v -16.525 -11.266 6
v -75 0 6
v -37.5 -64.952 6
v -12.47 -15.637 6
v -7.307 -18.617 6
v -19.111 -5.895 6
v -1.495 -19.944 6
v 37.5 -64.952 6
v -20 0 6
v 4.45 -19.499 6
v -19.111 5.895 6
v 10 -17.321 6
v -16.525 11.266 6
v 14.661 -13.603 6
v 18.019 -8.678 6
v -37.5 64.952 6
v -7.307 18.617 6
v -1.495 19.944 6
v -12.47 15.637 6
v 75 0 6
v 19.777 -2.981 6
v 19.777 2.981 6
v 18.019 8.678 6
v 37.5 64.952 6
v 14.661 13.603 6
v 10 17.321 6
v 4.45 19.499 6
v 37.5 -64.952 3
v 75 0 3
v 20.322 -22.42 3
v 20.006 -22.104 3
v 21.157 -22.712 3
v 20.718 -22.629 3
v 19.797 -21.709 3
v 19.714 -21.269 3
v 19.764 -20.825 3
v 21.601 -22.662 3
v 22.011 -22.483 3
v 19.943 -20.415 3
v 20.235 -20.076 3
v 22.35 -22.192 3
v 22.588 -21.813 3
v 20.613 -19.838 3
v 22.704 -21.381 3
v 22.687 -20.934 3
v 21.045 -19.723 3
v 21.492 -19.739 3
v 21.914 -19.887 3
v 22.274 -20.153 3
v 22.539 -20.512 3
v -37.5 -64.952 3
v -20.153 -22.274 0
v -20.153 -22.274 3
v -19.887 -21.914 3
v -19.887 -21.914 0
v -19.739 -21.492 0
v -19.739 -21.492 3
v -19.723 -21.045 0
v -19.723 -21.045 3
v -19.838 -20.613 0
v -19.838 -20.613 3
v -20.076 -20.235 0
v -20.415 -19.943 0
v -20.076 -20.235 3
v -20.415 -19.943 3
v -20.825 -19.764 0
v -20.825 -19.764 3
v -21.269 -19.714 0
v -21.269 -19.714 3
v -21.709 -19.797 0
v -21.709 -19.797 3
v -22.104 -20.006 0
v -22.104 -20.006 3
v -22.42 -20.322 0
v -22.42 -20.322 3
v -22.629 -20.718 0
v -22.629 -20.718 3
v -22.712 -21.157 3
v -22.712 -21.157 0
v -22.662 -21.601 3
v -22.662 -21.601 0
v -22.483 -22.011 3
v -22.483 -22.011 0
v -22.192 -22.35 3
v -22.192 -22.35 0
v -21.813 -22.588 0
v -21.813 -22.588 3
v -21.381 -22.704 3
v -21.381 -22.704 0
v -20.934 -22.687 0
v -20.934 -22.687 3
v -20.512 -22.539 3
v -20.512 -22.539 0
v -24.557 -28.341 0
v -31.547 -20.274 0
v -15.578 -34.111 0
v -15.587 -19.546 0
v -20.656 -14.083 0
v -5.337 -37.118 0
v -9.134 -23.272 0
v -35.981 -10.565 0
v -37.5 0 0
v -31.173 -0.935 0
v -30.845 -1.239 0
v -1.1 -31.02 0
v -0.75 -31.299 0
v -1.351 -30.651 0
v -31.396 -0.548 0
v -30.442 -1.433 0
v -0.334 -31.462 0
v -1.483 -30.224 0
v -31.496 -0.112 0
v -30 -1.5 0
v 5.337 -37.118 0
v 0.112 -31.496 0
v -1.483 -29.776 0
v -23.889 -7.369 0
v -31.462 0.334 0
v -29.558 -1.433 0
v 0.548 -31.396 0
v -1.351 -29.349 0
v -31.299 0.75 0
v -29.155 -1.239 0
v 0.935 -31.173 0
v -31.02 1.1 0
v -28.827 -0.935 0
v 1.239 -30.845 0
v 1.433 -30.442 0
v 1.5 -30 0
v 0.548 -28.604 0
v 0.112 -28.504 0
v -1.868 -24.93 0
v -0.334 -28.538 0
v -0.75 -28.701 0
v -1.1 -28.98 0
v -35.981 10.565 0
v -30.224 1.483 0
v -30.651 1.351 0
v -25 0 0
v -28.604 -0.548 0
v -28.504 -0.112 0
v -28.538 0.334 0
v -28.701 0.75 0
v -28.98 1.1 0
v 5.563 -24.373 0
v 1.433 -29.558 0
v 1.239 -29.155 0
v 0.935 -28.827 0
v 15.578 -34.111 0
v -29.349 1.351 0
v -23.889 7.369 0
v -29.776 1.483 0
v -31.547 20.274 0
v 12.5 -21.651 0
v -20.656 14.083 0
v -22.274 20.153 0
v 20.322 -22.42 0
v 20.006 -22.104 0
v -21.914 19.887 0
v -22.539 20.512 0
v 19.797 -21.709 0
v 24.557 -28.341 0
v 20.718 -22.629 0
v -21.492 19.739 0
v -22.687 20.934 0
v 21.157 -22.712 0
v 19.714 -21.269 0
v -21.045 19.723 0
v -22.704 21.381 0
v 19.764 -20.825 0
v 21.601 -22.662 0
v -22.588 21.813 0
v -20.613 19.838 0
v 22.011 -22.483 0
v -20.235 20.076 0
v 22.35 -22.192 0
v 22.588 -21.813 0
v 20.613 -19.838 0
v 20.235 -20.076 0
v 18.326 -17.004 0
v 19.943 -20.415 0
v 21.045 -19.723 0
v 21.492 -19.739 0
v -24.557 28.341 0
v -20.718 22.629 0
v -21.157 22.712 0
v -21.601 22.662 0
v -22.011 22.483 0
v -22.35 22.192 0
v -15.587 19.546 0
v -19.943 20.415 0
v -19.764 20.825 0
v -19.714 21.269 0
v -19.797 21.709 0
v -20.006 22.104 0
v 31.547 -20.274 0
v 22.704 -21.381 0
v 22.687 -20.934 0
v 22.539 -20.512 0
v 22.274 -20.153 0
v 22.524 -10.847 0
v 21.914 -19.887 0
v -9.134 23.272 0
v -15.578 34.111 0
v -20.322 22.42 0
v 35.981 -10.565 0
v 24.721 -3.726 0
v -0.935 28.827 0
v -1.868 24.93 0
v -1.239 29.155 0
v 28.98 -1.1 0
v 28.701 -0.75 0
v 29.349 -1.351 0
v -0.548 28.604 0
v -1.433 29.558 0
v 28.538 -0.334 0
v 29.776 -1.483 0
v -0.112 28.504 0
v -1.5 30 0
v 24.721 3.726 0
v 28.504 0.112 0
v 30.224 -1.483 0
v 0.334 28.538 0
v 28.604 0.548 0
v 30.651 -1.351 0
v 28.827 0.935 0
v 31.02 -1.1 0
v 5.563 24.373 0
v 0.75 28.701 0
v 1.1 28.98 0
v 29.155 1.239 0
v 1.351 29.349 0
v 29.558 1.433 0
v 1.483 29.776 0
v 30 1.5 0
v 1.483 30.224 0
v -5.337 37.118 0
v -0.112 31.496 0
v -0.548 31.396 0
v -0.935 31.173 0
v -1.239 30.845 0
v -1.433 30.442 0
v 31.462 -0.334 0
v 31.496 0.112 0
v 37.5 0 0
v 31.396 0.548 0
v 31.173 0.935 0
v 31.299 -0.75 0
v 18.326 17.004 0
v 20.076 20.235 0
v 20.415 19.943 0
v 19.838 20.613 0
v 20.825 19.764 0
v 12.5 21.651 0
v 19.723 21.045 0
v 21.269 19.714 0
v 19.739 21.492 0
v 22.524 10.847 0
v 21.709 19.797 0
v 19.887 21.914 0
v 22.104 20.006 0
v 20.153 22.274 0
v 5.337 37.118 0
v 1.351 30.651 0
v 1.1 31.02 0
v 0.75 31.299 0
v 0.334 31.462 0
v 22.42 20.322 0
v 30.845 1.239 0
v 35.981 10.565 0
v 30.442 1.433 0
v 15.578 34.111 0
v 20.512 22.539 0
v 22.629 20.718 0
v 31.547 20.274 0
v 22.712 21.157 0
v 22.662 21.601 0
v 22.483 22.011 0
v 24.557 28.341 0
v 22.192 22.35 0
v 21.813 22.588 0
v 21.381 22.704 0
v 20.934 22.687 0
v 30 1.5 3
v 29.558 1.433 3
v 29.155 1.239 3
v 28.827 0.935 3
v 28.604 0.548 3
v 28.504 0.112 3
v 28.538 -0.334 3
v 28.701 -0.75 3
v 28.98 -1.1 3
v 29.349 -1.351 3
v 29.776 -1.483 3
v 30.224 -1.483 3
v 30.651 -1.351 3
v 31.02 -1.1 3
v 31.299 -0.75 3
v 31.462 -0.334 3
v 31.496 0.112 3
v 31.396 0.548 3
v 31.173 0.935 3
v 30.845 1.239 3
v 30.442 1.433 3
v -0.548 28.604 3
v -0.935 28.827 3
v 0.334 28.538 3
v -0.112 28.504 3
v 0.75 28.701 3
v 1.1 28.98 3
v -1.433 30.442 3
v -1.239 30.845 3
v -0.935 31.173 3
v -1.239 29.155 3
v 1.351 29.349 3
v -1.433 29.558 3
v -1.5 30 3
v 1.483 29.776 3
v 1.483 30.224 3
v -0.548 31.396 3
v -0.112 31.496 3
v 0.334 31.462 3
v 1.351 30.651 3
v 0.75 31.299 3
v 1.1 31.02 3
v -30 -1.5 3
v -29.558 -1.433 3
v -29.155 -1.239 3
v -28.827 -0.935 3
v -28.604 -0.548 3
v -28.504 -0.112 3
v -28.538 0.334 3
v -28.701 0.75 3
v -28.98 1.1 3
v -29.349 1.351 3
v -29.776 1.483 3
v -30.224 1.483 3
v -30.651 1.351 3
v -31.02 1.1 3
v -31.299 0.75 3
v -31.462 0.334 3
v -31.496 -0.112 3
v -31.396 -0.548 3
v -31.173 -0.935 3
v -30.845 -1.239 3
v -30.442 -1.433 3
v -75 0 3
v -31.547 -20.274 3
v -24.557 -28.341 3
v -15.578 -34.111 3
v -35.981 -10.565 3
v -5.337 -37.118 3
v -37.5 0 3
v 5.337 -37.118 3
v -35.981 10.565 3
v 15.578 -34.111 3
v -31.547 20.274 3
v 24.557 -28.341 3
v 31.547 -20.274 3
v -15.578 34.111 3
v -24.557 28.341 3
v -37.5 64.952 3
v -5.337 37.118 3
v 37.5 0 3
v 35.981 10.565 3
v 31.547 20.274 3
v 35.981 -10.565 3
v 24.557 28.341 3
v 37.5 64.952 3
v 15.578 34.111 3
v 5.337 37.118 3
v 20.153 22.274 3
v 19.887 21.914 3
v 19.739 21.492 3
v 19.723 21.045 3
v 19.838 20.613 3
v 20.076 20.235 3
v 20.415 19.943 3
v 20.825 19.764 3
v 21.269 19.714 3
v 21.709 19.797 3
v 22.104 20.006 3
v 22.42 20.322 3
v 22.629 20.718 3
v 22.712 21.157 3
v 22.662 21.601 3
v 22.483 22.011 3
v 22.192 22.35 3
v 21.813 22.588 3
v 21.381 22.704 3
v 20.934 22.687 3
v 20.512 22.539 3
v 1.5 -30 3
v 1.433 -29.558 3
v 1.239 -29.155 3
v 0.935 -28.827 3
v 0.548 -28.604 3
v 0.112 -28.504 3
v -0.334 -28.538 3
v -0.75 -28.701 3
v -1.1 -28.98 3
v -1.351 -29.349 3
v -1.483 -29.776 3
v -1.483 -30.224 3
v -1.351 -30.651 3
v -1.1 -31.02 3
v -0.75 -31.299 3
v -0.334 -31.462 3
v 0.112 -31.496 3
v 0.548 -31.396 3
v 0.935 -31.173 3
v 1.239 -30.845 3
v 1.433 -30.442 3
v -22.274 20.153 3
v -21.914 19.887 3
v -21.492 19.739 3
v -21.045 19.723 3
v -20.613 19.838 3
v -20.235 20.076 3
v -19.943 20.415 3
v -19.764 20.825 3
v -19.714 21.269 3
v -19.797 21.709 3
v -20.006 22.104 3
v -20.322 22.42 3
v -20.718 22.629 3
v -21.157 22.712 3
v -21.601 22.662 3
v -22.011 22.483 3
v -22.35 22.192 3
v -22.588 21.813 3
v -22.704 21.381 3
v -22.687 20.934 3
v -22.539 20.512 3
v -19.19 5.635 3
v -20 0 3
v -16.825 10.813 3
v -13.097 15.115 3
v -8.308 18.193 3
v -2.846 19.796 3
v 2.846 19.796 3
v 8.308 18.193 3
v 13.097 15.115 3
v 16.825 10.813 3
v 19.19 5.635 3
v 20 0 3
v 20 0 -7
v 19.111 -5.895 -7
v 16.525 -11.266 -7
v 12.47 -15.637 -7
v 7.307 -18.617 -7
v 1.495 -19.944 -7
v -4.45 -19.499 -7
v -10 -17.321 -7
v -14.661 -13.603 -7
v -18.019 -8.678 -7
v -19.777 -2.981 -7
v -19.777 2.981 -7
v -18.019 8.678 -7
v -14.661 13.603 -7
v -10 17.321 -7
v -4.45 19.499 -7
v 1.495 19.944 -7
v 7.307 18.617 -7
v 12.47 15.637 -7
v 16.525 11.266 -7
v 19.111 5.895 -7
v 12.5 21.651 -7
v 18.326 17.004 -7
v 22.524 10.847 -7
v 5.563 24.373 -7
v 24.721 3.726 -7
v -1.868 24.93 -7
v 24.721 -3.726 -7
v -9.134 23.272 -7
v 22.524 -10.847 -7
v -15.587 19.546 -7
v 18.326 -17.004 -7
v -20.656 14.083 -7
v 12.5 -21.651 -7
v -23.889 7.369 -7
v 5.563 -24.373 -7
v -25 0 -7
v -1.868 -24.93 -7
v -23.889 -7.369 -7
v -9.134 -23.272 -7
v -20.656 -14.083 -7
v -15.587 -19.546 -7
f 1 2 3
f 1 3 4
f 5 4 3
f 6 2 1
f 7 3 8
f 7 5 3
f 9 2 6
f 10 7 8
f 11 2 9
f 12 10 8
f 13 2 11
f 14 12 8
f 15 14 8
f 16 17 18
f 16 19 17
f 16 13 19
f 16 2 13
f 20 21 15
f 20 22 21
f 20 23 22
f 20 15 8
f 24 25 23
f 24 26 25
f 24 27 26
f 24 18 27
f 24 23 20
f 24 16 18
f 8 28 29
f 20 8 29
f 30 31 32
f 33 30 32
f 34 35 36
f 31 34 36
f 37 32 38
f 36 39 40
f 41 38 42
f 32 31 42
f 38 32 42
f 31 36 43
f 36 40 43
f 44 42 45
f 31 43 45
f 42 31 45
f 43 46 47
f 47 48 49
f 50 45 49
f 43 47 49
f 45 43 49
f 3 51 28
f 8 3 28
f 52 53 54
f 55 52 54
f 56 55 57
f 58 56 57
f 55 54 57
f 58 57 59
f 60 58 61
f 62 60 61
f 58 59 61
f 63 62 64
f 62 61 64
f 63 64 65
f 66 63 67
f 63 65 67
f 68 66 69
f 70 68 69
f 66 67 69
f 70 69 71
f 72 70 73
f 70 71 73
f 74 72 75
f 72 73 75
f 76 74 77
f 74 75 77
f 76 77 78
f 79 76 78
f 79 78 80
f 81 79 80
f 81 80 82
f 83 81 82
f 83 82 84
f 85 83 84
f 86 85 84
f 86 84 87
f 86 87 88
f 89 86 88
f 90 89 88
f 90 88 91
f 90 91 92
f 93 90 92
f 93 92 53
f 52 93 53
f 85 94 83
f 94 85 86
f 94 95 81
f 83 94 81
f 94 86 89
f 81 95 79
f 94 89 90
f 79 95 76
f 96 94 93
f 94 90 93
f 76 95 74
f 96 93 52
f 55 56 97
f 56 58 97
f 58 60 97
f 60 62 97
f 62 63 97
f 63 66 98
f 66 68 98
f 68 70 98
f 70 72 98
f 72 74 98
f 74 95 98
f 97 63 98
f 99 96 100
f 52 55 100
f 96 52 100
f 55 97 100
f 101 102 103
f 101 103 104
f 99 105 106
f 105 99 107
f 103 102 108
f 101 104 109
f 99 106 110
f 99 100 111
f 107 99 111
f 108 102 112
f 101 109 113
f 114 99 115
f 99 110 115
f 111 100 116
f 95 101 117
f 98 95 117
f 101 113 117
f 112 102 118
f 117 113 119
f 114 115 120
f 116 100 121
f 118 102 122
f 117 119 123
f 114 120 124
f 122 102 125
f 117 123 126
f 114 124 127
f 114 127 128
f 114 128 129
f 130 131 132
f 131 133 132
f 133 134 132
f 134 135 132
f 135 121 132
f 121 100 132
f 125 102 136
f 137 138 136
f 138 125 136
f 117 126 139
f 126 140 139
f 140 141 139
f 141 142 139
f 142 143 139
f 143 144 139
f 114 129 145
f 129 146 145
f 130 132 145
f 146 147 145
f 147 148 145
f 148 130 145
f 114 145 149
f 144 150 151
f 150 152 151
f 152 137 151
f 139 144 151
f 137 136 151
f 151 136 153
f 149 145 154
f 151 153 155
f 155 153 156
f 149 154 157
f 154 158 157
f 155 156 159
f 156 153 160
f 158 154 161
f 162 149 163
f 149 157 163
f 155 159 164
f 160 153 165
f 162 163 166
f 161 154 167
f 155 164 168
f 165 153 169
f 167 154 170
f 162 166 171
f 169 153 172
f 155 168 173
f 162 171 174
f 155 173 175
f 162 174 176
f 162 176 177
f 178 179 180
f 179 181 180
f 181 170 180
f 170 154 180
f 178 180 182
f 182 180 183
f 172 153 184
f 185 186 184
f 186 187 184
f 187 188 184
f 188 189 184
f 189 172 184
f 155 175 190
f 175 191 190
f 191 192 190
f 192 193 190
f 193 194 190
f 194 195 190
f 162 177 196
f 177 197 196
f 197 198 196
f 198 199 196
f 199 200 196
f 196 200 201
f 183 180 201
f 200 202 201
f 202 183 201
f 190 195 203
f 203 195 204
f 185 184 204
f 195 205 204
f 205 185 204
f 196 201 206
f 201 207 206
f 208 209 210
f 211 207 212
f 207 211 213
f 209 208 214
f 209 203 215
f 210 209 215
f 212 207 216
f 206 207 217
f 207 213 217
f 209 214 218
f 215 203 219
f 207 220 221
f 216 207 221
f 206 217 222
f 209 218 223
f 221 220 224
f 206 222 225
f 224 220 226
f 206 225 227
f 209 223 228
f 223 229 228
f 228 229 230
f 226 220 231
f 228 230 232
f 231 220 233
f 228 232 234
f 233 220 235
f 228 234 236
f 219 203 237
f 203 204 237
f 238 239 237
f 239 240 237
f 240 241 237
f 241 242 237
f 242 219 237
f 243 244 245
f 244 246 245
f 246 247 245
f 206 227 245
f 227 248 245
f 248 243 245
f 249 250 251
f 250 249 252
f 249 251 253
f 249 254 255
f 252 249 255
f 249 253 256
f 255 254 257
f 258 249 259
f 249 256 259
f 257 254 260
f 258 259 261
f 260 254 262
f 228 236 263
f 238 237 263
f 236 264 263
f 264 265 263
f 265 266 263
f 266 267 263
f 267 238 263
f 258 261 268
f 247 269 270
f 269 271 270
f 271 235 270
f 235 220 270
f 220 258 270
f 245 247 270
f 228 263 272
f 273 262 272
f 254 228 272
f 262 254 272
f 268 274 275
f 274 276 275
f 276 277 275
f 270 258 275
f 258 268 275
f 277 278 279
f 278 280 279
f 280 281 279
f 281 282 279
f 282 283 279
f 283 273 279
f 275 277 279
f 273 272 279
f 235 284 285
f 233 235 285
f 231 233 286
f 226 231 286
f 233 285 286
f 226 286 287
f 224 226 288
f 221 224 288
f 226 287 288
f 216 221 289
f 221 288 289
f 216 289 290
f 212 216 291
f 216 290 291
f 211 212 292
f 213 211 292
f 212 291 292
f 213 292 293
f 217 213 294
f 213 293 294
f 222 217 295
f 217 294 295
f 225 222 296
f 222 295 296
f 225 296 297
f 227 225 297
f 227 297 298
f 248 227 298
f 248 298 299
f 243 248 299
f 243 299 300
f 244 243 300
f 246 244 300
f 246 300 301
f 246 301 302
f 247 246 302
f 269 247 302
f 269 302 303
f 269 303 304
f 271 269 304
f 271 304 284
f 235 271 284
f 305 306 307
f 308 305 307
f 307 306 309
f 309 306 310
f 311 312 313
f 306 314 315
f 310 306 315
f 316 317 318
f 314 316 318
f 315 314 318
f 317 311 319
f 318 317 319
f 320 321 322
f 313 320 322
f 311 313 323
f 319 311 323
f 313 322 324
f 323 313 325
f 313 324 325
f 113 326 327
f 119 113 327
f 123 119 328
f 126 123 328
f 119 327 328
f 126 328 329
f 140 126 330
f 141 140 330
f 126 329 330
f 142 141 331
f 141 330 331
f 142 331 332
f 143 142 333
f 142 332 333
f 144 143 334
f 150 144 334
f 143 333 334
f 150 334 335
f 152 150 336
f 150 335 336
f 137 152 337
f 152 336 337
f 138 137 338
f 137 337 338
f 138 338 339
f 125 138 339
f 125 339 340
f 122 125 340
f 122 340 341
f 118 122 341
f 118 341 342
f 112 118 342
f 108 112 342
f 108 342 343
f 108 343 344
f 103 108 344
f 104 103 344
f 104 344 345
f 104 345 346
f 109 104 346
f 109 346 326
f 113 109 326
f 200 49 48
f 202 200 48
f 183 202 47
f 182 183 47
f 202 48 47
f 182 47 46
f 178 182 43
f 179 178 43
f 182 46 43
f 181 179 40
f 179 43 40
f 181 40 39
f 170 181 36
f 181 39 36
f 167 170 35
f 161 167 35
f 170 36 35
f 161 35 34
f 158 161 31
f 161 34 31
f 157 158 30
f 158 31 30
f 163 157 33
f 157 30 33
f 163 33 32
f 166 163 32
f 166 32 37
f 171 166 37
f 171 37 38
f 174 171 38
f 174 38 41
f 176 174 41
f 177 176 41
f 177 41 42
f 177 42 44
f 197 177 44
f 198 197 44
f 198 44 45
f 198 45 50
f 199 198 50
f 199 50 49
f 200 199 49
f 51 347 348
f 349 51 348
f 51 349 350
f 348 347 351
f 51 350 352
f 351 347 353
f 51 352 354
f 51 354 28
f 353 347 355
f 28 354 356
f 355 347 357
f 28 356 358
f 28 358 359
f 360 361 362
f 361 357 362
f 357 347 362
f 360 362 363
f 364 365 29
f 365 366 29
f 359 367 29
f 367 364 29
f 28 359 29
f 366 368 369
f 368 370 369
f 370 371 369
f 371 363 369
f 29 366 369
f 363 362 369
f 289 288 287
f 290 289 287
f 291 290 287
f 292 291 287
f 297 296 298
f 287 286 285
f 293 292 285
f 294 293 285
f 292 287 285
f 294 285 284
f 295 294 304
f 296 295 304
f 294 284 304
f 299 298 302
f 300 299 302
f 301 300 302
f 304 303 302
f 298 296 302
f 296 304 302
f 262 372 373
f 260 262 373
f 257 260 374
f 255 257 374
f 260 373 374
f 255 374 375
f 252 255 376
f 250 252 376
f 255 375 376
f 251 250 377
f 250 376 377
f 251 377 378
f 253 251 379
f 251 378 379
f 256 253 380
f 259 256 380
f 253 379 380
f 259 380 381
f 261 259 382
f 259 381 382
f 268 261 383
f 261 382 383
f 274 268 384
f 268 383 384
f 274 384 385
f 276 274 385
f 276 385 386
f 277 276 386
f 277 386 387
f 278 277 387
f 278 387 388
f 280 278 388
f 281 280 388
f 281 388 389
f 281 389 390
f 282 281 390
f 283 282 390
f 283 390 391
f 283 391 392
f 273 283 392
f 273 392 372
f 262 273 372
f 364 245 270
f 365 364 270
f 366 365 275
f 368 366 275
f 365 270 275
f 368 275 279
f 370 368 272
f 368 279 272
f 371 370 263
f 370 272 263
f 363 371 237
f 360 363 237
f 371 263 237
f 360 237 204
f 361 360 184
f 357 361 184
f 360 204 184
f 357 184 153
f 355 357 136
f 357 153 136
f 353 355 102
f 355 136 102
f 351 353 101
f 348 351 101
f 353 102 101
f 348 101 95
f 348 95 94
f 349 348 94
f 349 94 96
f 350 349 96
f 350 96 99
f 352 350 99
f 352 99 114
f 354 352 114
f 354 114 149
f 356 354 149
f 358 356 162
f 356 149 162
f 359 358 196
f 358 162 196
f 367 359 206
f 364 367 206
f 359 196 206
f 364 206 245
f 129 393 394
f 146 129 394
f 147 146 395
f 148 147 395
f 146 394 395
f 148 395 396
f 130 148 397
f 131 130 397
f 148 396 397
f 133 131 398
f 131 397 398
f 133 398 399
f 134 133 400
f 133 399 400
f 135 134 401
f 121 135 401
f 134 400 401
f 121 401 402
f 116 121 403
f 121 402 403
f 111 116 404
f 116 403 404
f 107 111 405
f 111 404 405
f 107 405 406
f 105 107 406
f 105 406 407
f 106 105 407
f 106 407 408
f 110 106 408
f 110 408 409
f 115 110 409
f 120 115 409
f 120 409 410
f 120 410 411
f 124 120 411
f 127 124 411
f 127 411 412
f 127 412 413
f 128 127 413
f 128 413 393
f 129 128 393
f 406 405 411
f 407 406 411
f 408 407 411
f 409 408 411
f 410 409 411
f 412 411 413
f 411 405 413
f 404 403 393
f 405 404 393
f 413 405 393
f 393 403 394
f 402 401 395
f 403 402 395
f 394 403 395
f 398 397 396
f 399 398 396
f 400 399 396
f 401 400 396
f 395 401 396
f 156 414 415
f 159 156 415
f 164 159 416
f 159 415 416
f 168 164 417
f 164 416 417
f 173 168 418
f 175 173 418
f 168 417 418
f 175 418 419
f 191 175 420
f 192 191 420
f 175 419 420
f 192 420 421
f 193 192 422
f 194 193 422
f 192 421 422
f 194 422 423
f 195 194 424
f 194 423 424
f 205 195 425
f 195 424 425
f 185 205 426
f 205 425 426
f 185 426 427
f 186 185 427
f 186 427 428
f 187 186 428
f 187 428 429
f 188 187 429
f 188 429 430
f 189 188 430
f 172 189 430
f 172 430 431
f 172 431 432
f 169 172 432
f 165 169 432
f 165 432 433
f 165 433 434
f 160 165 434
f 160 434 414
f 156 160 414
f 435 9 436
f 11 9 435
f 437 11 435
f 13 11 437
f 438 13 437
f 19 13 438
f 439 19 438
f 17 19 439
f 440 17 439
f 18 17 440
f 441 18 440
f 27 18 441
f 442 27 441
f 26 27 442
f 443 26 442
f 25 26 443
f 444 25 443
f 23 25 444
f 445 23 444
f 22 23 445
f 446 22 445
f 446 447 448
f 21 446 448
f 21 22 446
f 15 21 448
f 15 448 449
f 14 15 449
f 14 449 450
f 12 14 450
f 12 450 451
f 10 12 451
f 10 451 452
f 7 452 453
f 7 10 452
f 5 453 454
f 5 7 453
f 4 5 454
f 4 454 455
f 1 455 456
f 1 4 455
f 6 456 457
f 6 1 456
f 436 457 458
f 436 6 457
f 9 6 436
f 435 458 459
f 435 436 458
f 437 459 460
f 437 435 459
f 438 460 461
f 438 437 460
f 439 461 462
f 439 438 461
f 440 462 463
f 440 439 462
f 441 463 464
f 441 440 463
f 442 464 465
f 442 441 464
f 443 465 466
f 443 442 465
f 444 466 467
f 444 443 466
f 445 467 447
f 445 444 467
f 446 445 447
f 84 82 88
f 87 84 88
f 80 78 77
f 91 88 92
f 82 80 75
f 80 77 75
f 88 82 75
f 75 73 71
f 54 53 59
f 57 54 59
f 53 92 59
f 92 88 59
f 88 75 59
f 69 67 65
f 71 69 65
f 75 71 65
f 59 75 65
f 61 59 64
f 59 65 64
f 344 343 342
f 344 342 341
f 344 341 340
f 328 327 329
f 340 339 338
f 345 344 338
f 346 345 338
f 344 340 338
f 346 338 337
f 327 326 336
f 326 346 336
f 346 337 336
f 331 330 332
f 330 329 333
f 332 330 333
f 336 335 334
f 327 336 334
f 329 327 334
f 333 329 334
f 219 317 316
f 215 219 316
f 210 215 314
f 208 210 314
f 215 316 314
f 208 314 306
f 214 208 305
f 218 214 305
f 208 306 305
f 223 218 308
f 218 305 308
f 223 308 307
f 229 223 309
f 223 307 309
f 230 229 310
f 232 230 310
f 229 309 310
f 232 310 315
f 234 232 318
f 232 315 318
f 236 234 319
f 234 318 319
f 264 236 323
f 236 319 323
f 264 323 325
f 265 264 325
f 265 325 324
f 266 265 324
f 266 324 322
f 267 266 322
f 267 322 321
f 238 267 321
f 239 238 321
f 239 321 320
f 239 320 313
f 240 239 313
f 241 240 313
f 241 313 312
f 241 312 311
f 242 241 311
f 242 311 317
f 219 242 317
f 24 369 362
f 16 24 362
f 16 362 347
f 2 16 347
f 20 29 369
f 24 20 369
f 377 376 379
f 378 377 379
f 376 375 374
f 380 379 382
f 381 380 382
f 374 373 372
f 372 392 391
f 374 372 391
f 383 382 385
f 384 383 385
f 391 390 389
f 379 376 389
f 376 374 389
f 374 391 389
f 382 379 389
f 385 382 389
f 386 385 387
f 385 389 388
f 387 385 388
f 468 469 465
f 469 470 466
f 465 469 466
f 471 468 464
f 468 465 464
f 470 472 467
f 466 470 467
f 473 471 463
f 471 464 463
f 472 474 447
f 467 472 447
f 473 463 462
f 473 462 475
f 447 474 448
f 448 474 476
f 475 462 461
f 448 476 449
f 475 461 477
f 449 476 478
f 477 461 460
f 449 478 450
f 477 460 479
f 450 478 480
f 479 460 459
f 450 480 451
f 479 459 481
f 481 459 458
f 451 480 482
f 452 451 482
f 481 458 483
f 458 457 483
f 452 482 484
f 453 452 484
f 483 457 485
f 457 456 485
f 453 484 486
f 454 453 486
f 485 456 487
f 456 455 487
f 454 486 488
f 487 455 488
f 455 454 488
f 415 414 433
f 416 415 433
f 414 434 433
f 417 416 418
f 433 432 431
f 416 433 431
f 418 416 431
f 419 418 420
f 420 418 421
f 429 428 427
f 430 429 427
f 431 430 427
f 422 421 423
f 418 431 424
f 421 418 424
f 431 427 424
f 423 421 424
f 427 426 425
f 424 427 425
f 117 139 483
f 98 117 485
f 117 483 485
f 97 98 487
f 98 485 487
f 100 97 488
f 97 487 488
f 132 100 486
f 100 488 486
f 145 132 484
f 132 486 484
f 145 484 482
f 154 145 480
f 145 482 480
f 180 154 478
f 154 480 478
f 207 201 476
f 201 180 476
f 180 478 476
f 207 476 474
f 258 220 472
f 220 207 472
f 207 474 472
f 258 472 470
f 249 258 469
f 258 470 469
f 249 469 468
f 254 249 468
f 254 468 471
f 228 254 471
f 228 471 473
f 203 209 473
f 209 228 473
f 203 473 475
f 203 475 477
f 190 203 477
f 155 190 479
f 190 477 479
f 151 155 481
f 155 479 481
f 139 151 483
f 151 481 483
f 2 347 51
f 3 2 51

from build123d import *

# Parameters (mm, degrees)
SKETCH_1_R               = 37.5
EXTRUDE_1_DEPTH          = 3
SKETCH_2_R               = 25
CUT_EXTRUDE_1_DEPTH      = 3
SKETCH_3_R               = 1.5
CUT_EXTRUDE_2_DEPTH      = 13
PATTERN_CIRCULAR_1_COUNT = 8
EXTRUDE_2_DEPTH          = 5
EXTRUDE_2_DEPTH_BACK     = 10
SKETCH_4_R               = 25
SKETCH_4_R_2             = 20
SKETCH_7_R               = 28.195307437
CUT_EXTRUDE_3_DEPTH      = 5
EXTRUDE_3_DEPTH          = 3
CUT_EXTRUDE_4_DEPTH      = 100.718353376
CUT_EXTRUDE_4_DEPTH_BACK = 100.718353376
SKETCH_9_R               = 20


with BuildPart() as part:
    # 草图1 → 凸台-拉伸1 (new body)
    with BuildSketch(Plane.XY):
        Circle(SKETCH_1_R)
    extrude(amount=EXTRUDE_1_DEPTH)

    # 草图2 → 切除-拉伸1 (cut)
    with BuildSketch(Plane(origin=(0, 0, 0), x_dir=(-1, 0, 0), z_dir=(0, 0, -1))):
        Circle(SKETCH_2_R)
    extrude(amount=-CUT_EXTRUDE_1_DEPTH, mode=Mode.SUBTRACT)

    # 草图3 → 切除-拉伸2 (cut)
    with BuildSketch(Plane.XY.offset(3)):
        with Locations((0, -30)):
            Circle(SKETCH_3_R)
    cut_extrude_2 = extrude(amount=-CUT_EXTRUDE_2_DEPTH, mode=Mode.SUBTRACT)

    # 阵列(圆周)1: 切除-拉伸2 ×8 about axis
    pattern_circular_1_axis = Axis((0, 0, 0), (0, 0, 1))
    for i in range(1, PATTERN_CIRCULAR_1_COUNT):
        add(cut_extrude_2.rotate(pattern_circular_1_axis, i * 360 / PATTERN_CIRCULAR_1_COUNT), mode=Mode.SUBTRACT)

    # 草图4 → 凸台-拉伸2 (add, two sides: drawn at the far end of the back side and taken through both)
    with BuildSketch(Plane.XY.offset(3).offset(-EXTRUDE_2_DEPTH_BACK)):
        with Locations(Location((0, 0, 0), (0, 0, 180))):
            Circle(SKETCH_4_R)
        Circle(SKETCH_4_R_2, mode=Mode.SUBTRACT)
    extrude(amount=EXTRUDE_2_DEPTH + EXTRUDE_2_DEPTH_BACK)

    # 草图7 → 切除-拉伸3 (cut)
    with BuildSketch(Plane.XY.offset(8)):
        Circle(SKETCH_7_R)
    extrude(amount=-CUT_EXTRUDE_3_DEPTH, mode=Mode.SUBTRACT)

    # 草图8 → 凸台-拉伸3 (add)
    with BuildSketch(Plane.XY.offset(3)):
        Polygon((37.5, 64.951905284), (-37.5, 64.951905284), (-75, 0), (-37.5, -64.951905284), (37.5, -64.951905284), (75, 0), align=None)
    extrude(amount=EXTRUDE_3_DEPTH)

    # 草图9 → 切除-拉伸4 (cut, two sides: drawn at the far end of the back side and taken through both)
    with BuildSketch(Plane(origin=(0, 0, 3), x_dir=(-1, 0, 0), z_dir=(0, 0, -1)).offset(-CUT_EXTRUDE_4_DEPTH_BACK)):
        Circle(SKETCH_9_R)
    extrude(amount=CUT_EXTRUDE_4_DEPTH + CUT_EXTRUDE_4_DEPTH_BACK, mode=Mode.SUBTRACT)


solid = part.part
